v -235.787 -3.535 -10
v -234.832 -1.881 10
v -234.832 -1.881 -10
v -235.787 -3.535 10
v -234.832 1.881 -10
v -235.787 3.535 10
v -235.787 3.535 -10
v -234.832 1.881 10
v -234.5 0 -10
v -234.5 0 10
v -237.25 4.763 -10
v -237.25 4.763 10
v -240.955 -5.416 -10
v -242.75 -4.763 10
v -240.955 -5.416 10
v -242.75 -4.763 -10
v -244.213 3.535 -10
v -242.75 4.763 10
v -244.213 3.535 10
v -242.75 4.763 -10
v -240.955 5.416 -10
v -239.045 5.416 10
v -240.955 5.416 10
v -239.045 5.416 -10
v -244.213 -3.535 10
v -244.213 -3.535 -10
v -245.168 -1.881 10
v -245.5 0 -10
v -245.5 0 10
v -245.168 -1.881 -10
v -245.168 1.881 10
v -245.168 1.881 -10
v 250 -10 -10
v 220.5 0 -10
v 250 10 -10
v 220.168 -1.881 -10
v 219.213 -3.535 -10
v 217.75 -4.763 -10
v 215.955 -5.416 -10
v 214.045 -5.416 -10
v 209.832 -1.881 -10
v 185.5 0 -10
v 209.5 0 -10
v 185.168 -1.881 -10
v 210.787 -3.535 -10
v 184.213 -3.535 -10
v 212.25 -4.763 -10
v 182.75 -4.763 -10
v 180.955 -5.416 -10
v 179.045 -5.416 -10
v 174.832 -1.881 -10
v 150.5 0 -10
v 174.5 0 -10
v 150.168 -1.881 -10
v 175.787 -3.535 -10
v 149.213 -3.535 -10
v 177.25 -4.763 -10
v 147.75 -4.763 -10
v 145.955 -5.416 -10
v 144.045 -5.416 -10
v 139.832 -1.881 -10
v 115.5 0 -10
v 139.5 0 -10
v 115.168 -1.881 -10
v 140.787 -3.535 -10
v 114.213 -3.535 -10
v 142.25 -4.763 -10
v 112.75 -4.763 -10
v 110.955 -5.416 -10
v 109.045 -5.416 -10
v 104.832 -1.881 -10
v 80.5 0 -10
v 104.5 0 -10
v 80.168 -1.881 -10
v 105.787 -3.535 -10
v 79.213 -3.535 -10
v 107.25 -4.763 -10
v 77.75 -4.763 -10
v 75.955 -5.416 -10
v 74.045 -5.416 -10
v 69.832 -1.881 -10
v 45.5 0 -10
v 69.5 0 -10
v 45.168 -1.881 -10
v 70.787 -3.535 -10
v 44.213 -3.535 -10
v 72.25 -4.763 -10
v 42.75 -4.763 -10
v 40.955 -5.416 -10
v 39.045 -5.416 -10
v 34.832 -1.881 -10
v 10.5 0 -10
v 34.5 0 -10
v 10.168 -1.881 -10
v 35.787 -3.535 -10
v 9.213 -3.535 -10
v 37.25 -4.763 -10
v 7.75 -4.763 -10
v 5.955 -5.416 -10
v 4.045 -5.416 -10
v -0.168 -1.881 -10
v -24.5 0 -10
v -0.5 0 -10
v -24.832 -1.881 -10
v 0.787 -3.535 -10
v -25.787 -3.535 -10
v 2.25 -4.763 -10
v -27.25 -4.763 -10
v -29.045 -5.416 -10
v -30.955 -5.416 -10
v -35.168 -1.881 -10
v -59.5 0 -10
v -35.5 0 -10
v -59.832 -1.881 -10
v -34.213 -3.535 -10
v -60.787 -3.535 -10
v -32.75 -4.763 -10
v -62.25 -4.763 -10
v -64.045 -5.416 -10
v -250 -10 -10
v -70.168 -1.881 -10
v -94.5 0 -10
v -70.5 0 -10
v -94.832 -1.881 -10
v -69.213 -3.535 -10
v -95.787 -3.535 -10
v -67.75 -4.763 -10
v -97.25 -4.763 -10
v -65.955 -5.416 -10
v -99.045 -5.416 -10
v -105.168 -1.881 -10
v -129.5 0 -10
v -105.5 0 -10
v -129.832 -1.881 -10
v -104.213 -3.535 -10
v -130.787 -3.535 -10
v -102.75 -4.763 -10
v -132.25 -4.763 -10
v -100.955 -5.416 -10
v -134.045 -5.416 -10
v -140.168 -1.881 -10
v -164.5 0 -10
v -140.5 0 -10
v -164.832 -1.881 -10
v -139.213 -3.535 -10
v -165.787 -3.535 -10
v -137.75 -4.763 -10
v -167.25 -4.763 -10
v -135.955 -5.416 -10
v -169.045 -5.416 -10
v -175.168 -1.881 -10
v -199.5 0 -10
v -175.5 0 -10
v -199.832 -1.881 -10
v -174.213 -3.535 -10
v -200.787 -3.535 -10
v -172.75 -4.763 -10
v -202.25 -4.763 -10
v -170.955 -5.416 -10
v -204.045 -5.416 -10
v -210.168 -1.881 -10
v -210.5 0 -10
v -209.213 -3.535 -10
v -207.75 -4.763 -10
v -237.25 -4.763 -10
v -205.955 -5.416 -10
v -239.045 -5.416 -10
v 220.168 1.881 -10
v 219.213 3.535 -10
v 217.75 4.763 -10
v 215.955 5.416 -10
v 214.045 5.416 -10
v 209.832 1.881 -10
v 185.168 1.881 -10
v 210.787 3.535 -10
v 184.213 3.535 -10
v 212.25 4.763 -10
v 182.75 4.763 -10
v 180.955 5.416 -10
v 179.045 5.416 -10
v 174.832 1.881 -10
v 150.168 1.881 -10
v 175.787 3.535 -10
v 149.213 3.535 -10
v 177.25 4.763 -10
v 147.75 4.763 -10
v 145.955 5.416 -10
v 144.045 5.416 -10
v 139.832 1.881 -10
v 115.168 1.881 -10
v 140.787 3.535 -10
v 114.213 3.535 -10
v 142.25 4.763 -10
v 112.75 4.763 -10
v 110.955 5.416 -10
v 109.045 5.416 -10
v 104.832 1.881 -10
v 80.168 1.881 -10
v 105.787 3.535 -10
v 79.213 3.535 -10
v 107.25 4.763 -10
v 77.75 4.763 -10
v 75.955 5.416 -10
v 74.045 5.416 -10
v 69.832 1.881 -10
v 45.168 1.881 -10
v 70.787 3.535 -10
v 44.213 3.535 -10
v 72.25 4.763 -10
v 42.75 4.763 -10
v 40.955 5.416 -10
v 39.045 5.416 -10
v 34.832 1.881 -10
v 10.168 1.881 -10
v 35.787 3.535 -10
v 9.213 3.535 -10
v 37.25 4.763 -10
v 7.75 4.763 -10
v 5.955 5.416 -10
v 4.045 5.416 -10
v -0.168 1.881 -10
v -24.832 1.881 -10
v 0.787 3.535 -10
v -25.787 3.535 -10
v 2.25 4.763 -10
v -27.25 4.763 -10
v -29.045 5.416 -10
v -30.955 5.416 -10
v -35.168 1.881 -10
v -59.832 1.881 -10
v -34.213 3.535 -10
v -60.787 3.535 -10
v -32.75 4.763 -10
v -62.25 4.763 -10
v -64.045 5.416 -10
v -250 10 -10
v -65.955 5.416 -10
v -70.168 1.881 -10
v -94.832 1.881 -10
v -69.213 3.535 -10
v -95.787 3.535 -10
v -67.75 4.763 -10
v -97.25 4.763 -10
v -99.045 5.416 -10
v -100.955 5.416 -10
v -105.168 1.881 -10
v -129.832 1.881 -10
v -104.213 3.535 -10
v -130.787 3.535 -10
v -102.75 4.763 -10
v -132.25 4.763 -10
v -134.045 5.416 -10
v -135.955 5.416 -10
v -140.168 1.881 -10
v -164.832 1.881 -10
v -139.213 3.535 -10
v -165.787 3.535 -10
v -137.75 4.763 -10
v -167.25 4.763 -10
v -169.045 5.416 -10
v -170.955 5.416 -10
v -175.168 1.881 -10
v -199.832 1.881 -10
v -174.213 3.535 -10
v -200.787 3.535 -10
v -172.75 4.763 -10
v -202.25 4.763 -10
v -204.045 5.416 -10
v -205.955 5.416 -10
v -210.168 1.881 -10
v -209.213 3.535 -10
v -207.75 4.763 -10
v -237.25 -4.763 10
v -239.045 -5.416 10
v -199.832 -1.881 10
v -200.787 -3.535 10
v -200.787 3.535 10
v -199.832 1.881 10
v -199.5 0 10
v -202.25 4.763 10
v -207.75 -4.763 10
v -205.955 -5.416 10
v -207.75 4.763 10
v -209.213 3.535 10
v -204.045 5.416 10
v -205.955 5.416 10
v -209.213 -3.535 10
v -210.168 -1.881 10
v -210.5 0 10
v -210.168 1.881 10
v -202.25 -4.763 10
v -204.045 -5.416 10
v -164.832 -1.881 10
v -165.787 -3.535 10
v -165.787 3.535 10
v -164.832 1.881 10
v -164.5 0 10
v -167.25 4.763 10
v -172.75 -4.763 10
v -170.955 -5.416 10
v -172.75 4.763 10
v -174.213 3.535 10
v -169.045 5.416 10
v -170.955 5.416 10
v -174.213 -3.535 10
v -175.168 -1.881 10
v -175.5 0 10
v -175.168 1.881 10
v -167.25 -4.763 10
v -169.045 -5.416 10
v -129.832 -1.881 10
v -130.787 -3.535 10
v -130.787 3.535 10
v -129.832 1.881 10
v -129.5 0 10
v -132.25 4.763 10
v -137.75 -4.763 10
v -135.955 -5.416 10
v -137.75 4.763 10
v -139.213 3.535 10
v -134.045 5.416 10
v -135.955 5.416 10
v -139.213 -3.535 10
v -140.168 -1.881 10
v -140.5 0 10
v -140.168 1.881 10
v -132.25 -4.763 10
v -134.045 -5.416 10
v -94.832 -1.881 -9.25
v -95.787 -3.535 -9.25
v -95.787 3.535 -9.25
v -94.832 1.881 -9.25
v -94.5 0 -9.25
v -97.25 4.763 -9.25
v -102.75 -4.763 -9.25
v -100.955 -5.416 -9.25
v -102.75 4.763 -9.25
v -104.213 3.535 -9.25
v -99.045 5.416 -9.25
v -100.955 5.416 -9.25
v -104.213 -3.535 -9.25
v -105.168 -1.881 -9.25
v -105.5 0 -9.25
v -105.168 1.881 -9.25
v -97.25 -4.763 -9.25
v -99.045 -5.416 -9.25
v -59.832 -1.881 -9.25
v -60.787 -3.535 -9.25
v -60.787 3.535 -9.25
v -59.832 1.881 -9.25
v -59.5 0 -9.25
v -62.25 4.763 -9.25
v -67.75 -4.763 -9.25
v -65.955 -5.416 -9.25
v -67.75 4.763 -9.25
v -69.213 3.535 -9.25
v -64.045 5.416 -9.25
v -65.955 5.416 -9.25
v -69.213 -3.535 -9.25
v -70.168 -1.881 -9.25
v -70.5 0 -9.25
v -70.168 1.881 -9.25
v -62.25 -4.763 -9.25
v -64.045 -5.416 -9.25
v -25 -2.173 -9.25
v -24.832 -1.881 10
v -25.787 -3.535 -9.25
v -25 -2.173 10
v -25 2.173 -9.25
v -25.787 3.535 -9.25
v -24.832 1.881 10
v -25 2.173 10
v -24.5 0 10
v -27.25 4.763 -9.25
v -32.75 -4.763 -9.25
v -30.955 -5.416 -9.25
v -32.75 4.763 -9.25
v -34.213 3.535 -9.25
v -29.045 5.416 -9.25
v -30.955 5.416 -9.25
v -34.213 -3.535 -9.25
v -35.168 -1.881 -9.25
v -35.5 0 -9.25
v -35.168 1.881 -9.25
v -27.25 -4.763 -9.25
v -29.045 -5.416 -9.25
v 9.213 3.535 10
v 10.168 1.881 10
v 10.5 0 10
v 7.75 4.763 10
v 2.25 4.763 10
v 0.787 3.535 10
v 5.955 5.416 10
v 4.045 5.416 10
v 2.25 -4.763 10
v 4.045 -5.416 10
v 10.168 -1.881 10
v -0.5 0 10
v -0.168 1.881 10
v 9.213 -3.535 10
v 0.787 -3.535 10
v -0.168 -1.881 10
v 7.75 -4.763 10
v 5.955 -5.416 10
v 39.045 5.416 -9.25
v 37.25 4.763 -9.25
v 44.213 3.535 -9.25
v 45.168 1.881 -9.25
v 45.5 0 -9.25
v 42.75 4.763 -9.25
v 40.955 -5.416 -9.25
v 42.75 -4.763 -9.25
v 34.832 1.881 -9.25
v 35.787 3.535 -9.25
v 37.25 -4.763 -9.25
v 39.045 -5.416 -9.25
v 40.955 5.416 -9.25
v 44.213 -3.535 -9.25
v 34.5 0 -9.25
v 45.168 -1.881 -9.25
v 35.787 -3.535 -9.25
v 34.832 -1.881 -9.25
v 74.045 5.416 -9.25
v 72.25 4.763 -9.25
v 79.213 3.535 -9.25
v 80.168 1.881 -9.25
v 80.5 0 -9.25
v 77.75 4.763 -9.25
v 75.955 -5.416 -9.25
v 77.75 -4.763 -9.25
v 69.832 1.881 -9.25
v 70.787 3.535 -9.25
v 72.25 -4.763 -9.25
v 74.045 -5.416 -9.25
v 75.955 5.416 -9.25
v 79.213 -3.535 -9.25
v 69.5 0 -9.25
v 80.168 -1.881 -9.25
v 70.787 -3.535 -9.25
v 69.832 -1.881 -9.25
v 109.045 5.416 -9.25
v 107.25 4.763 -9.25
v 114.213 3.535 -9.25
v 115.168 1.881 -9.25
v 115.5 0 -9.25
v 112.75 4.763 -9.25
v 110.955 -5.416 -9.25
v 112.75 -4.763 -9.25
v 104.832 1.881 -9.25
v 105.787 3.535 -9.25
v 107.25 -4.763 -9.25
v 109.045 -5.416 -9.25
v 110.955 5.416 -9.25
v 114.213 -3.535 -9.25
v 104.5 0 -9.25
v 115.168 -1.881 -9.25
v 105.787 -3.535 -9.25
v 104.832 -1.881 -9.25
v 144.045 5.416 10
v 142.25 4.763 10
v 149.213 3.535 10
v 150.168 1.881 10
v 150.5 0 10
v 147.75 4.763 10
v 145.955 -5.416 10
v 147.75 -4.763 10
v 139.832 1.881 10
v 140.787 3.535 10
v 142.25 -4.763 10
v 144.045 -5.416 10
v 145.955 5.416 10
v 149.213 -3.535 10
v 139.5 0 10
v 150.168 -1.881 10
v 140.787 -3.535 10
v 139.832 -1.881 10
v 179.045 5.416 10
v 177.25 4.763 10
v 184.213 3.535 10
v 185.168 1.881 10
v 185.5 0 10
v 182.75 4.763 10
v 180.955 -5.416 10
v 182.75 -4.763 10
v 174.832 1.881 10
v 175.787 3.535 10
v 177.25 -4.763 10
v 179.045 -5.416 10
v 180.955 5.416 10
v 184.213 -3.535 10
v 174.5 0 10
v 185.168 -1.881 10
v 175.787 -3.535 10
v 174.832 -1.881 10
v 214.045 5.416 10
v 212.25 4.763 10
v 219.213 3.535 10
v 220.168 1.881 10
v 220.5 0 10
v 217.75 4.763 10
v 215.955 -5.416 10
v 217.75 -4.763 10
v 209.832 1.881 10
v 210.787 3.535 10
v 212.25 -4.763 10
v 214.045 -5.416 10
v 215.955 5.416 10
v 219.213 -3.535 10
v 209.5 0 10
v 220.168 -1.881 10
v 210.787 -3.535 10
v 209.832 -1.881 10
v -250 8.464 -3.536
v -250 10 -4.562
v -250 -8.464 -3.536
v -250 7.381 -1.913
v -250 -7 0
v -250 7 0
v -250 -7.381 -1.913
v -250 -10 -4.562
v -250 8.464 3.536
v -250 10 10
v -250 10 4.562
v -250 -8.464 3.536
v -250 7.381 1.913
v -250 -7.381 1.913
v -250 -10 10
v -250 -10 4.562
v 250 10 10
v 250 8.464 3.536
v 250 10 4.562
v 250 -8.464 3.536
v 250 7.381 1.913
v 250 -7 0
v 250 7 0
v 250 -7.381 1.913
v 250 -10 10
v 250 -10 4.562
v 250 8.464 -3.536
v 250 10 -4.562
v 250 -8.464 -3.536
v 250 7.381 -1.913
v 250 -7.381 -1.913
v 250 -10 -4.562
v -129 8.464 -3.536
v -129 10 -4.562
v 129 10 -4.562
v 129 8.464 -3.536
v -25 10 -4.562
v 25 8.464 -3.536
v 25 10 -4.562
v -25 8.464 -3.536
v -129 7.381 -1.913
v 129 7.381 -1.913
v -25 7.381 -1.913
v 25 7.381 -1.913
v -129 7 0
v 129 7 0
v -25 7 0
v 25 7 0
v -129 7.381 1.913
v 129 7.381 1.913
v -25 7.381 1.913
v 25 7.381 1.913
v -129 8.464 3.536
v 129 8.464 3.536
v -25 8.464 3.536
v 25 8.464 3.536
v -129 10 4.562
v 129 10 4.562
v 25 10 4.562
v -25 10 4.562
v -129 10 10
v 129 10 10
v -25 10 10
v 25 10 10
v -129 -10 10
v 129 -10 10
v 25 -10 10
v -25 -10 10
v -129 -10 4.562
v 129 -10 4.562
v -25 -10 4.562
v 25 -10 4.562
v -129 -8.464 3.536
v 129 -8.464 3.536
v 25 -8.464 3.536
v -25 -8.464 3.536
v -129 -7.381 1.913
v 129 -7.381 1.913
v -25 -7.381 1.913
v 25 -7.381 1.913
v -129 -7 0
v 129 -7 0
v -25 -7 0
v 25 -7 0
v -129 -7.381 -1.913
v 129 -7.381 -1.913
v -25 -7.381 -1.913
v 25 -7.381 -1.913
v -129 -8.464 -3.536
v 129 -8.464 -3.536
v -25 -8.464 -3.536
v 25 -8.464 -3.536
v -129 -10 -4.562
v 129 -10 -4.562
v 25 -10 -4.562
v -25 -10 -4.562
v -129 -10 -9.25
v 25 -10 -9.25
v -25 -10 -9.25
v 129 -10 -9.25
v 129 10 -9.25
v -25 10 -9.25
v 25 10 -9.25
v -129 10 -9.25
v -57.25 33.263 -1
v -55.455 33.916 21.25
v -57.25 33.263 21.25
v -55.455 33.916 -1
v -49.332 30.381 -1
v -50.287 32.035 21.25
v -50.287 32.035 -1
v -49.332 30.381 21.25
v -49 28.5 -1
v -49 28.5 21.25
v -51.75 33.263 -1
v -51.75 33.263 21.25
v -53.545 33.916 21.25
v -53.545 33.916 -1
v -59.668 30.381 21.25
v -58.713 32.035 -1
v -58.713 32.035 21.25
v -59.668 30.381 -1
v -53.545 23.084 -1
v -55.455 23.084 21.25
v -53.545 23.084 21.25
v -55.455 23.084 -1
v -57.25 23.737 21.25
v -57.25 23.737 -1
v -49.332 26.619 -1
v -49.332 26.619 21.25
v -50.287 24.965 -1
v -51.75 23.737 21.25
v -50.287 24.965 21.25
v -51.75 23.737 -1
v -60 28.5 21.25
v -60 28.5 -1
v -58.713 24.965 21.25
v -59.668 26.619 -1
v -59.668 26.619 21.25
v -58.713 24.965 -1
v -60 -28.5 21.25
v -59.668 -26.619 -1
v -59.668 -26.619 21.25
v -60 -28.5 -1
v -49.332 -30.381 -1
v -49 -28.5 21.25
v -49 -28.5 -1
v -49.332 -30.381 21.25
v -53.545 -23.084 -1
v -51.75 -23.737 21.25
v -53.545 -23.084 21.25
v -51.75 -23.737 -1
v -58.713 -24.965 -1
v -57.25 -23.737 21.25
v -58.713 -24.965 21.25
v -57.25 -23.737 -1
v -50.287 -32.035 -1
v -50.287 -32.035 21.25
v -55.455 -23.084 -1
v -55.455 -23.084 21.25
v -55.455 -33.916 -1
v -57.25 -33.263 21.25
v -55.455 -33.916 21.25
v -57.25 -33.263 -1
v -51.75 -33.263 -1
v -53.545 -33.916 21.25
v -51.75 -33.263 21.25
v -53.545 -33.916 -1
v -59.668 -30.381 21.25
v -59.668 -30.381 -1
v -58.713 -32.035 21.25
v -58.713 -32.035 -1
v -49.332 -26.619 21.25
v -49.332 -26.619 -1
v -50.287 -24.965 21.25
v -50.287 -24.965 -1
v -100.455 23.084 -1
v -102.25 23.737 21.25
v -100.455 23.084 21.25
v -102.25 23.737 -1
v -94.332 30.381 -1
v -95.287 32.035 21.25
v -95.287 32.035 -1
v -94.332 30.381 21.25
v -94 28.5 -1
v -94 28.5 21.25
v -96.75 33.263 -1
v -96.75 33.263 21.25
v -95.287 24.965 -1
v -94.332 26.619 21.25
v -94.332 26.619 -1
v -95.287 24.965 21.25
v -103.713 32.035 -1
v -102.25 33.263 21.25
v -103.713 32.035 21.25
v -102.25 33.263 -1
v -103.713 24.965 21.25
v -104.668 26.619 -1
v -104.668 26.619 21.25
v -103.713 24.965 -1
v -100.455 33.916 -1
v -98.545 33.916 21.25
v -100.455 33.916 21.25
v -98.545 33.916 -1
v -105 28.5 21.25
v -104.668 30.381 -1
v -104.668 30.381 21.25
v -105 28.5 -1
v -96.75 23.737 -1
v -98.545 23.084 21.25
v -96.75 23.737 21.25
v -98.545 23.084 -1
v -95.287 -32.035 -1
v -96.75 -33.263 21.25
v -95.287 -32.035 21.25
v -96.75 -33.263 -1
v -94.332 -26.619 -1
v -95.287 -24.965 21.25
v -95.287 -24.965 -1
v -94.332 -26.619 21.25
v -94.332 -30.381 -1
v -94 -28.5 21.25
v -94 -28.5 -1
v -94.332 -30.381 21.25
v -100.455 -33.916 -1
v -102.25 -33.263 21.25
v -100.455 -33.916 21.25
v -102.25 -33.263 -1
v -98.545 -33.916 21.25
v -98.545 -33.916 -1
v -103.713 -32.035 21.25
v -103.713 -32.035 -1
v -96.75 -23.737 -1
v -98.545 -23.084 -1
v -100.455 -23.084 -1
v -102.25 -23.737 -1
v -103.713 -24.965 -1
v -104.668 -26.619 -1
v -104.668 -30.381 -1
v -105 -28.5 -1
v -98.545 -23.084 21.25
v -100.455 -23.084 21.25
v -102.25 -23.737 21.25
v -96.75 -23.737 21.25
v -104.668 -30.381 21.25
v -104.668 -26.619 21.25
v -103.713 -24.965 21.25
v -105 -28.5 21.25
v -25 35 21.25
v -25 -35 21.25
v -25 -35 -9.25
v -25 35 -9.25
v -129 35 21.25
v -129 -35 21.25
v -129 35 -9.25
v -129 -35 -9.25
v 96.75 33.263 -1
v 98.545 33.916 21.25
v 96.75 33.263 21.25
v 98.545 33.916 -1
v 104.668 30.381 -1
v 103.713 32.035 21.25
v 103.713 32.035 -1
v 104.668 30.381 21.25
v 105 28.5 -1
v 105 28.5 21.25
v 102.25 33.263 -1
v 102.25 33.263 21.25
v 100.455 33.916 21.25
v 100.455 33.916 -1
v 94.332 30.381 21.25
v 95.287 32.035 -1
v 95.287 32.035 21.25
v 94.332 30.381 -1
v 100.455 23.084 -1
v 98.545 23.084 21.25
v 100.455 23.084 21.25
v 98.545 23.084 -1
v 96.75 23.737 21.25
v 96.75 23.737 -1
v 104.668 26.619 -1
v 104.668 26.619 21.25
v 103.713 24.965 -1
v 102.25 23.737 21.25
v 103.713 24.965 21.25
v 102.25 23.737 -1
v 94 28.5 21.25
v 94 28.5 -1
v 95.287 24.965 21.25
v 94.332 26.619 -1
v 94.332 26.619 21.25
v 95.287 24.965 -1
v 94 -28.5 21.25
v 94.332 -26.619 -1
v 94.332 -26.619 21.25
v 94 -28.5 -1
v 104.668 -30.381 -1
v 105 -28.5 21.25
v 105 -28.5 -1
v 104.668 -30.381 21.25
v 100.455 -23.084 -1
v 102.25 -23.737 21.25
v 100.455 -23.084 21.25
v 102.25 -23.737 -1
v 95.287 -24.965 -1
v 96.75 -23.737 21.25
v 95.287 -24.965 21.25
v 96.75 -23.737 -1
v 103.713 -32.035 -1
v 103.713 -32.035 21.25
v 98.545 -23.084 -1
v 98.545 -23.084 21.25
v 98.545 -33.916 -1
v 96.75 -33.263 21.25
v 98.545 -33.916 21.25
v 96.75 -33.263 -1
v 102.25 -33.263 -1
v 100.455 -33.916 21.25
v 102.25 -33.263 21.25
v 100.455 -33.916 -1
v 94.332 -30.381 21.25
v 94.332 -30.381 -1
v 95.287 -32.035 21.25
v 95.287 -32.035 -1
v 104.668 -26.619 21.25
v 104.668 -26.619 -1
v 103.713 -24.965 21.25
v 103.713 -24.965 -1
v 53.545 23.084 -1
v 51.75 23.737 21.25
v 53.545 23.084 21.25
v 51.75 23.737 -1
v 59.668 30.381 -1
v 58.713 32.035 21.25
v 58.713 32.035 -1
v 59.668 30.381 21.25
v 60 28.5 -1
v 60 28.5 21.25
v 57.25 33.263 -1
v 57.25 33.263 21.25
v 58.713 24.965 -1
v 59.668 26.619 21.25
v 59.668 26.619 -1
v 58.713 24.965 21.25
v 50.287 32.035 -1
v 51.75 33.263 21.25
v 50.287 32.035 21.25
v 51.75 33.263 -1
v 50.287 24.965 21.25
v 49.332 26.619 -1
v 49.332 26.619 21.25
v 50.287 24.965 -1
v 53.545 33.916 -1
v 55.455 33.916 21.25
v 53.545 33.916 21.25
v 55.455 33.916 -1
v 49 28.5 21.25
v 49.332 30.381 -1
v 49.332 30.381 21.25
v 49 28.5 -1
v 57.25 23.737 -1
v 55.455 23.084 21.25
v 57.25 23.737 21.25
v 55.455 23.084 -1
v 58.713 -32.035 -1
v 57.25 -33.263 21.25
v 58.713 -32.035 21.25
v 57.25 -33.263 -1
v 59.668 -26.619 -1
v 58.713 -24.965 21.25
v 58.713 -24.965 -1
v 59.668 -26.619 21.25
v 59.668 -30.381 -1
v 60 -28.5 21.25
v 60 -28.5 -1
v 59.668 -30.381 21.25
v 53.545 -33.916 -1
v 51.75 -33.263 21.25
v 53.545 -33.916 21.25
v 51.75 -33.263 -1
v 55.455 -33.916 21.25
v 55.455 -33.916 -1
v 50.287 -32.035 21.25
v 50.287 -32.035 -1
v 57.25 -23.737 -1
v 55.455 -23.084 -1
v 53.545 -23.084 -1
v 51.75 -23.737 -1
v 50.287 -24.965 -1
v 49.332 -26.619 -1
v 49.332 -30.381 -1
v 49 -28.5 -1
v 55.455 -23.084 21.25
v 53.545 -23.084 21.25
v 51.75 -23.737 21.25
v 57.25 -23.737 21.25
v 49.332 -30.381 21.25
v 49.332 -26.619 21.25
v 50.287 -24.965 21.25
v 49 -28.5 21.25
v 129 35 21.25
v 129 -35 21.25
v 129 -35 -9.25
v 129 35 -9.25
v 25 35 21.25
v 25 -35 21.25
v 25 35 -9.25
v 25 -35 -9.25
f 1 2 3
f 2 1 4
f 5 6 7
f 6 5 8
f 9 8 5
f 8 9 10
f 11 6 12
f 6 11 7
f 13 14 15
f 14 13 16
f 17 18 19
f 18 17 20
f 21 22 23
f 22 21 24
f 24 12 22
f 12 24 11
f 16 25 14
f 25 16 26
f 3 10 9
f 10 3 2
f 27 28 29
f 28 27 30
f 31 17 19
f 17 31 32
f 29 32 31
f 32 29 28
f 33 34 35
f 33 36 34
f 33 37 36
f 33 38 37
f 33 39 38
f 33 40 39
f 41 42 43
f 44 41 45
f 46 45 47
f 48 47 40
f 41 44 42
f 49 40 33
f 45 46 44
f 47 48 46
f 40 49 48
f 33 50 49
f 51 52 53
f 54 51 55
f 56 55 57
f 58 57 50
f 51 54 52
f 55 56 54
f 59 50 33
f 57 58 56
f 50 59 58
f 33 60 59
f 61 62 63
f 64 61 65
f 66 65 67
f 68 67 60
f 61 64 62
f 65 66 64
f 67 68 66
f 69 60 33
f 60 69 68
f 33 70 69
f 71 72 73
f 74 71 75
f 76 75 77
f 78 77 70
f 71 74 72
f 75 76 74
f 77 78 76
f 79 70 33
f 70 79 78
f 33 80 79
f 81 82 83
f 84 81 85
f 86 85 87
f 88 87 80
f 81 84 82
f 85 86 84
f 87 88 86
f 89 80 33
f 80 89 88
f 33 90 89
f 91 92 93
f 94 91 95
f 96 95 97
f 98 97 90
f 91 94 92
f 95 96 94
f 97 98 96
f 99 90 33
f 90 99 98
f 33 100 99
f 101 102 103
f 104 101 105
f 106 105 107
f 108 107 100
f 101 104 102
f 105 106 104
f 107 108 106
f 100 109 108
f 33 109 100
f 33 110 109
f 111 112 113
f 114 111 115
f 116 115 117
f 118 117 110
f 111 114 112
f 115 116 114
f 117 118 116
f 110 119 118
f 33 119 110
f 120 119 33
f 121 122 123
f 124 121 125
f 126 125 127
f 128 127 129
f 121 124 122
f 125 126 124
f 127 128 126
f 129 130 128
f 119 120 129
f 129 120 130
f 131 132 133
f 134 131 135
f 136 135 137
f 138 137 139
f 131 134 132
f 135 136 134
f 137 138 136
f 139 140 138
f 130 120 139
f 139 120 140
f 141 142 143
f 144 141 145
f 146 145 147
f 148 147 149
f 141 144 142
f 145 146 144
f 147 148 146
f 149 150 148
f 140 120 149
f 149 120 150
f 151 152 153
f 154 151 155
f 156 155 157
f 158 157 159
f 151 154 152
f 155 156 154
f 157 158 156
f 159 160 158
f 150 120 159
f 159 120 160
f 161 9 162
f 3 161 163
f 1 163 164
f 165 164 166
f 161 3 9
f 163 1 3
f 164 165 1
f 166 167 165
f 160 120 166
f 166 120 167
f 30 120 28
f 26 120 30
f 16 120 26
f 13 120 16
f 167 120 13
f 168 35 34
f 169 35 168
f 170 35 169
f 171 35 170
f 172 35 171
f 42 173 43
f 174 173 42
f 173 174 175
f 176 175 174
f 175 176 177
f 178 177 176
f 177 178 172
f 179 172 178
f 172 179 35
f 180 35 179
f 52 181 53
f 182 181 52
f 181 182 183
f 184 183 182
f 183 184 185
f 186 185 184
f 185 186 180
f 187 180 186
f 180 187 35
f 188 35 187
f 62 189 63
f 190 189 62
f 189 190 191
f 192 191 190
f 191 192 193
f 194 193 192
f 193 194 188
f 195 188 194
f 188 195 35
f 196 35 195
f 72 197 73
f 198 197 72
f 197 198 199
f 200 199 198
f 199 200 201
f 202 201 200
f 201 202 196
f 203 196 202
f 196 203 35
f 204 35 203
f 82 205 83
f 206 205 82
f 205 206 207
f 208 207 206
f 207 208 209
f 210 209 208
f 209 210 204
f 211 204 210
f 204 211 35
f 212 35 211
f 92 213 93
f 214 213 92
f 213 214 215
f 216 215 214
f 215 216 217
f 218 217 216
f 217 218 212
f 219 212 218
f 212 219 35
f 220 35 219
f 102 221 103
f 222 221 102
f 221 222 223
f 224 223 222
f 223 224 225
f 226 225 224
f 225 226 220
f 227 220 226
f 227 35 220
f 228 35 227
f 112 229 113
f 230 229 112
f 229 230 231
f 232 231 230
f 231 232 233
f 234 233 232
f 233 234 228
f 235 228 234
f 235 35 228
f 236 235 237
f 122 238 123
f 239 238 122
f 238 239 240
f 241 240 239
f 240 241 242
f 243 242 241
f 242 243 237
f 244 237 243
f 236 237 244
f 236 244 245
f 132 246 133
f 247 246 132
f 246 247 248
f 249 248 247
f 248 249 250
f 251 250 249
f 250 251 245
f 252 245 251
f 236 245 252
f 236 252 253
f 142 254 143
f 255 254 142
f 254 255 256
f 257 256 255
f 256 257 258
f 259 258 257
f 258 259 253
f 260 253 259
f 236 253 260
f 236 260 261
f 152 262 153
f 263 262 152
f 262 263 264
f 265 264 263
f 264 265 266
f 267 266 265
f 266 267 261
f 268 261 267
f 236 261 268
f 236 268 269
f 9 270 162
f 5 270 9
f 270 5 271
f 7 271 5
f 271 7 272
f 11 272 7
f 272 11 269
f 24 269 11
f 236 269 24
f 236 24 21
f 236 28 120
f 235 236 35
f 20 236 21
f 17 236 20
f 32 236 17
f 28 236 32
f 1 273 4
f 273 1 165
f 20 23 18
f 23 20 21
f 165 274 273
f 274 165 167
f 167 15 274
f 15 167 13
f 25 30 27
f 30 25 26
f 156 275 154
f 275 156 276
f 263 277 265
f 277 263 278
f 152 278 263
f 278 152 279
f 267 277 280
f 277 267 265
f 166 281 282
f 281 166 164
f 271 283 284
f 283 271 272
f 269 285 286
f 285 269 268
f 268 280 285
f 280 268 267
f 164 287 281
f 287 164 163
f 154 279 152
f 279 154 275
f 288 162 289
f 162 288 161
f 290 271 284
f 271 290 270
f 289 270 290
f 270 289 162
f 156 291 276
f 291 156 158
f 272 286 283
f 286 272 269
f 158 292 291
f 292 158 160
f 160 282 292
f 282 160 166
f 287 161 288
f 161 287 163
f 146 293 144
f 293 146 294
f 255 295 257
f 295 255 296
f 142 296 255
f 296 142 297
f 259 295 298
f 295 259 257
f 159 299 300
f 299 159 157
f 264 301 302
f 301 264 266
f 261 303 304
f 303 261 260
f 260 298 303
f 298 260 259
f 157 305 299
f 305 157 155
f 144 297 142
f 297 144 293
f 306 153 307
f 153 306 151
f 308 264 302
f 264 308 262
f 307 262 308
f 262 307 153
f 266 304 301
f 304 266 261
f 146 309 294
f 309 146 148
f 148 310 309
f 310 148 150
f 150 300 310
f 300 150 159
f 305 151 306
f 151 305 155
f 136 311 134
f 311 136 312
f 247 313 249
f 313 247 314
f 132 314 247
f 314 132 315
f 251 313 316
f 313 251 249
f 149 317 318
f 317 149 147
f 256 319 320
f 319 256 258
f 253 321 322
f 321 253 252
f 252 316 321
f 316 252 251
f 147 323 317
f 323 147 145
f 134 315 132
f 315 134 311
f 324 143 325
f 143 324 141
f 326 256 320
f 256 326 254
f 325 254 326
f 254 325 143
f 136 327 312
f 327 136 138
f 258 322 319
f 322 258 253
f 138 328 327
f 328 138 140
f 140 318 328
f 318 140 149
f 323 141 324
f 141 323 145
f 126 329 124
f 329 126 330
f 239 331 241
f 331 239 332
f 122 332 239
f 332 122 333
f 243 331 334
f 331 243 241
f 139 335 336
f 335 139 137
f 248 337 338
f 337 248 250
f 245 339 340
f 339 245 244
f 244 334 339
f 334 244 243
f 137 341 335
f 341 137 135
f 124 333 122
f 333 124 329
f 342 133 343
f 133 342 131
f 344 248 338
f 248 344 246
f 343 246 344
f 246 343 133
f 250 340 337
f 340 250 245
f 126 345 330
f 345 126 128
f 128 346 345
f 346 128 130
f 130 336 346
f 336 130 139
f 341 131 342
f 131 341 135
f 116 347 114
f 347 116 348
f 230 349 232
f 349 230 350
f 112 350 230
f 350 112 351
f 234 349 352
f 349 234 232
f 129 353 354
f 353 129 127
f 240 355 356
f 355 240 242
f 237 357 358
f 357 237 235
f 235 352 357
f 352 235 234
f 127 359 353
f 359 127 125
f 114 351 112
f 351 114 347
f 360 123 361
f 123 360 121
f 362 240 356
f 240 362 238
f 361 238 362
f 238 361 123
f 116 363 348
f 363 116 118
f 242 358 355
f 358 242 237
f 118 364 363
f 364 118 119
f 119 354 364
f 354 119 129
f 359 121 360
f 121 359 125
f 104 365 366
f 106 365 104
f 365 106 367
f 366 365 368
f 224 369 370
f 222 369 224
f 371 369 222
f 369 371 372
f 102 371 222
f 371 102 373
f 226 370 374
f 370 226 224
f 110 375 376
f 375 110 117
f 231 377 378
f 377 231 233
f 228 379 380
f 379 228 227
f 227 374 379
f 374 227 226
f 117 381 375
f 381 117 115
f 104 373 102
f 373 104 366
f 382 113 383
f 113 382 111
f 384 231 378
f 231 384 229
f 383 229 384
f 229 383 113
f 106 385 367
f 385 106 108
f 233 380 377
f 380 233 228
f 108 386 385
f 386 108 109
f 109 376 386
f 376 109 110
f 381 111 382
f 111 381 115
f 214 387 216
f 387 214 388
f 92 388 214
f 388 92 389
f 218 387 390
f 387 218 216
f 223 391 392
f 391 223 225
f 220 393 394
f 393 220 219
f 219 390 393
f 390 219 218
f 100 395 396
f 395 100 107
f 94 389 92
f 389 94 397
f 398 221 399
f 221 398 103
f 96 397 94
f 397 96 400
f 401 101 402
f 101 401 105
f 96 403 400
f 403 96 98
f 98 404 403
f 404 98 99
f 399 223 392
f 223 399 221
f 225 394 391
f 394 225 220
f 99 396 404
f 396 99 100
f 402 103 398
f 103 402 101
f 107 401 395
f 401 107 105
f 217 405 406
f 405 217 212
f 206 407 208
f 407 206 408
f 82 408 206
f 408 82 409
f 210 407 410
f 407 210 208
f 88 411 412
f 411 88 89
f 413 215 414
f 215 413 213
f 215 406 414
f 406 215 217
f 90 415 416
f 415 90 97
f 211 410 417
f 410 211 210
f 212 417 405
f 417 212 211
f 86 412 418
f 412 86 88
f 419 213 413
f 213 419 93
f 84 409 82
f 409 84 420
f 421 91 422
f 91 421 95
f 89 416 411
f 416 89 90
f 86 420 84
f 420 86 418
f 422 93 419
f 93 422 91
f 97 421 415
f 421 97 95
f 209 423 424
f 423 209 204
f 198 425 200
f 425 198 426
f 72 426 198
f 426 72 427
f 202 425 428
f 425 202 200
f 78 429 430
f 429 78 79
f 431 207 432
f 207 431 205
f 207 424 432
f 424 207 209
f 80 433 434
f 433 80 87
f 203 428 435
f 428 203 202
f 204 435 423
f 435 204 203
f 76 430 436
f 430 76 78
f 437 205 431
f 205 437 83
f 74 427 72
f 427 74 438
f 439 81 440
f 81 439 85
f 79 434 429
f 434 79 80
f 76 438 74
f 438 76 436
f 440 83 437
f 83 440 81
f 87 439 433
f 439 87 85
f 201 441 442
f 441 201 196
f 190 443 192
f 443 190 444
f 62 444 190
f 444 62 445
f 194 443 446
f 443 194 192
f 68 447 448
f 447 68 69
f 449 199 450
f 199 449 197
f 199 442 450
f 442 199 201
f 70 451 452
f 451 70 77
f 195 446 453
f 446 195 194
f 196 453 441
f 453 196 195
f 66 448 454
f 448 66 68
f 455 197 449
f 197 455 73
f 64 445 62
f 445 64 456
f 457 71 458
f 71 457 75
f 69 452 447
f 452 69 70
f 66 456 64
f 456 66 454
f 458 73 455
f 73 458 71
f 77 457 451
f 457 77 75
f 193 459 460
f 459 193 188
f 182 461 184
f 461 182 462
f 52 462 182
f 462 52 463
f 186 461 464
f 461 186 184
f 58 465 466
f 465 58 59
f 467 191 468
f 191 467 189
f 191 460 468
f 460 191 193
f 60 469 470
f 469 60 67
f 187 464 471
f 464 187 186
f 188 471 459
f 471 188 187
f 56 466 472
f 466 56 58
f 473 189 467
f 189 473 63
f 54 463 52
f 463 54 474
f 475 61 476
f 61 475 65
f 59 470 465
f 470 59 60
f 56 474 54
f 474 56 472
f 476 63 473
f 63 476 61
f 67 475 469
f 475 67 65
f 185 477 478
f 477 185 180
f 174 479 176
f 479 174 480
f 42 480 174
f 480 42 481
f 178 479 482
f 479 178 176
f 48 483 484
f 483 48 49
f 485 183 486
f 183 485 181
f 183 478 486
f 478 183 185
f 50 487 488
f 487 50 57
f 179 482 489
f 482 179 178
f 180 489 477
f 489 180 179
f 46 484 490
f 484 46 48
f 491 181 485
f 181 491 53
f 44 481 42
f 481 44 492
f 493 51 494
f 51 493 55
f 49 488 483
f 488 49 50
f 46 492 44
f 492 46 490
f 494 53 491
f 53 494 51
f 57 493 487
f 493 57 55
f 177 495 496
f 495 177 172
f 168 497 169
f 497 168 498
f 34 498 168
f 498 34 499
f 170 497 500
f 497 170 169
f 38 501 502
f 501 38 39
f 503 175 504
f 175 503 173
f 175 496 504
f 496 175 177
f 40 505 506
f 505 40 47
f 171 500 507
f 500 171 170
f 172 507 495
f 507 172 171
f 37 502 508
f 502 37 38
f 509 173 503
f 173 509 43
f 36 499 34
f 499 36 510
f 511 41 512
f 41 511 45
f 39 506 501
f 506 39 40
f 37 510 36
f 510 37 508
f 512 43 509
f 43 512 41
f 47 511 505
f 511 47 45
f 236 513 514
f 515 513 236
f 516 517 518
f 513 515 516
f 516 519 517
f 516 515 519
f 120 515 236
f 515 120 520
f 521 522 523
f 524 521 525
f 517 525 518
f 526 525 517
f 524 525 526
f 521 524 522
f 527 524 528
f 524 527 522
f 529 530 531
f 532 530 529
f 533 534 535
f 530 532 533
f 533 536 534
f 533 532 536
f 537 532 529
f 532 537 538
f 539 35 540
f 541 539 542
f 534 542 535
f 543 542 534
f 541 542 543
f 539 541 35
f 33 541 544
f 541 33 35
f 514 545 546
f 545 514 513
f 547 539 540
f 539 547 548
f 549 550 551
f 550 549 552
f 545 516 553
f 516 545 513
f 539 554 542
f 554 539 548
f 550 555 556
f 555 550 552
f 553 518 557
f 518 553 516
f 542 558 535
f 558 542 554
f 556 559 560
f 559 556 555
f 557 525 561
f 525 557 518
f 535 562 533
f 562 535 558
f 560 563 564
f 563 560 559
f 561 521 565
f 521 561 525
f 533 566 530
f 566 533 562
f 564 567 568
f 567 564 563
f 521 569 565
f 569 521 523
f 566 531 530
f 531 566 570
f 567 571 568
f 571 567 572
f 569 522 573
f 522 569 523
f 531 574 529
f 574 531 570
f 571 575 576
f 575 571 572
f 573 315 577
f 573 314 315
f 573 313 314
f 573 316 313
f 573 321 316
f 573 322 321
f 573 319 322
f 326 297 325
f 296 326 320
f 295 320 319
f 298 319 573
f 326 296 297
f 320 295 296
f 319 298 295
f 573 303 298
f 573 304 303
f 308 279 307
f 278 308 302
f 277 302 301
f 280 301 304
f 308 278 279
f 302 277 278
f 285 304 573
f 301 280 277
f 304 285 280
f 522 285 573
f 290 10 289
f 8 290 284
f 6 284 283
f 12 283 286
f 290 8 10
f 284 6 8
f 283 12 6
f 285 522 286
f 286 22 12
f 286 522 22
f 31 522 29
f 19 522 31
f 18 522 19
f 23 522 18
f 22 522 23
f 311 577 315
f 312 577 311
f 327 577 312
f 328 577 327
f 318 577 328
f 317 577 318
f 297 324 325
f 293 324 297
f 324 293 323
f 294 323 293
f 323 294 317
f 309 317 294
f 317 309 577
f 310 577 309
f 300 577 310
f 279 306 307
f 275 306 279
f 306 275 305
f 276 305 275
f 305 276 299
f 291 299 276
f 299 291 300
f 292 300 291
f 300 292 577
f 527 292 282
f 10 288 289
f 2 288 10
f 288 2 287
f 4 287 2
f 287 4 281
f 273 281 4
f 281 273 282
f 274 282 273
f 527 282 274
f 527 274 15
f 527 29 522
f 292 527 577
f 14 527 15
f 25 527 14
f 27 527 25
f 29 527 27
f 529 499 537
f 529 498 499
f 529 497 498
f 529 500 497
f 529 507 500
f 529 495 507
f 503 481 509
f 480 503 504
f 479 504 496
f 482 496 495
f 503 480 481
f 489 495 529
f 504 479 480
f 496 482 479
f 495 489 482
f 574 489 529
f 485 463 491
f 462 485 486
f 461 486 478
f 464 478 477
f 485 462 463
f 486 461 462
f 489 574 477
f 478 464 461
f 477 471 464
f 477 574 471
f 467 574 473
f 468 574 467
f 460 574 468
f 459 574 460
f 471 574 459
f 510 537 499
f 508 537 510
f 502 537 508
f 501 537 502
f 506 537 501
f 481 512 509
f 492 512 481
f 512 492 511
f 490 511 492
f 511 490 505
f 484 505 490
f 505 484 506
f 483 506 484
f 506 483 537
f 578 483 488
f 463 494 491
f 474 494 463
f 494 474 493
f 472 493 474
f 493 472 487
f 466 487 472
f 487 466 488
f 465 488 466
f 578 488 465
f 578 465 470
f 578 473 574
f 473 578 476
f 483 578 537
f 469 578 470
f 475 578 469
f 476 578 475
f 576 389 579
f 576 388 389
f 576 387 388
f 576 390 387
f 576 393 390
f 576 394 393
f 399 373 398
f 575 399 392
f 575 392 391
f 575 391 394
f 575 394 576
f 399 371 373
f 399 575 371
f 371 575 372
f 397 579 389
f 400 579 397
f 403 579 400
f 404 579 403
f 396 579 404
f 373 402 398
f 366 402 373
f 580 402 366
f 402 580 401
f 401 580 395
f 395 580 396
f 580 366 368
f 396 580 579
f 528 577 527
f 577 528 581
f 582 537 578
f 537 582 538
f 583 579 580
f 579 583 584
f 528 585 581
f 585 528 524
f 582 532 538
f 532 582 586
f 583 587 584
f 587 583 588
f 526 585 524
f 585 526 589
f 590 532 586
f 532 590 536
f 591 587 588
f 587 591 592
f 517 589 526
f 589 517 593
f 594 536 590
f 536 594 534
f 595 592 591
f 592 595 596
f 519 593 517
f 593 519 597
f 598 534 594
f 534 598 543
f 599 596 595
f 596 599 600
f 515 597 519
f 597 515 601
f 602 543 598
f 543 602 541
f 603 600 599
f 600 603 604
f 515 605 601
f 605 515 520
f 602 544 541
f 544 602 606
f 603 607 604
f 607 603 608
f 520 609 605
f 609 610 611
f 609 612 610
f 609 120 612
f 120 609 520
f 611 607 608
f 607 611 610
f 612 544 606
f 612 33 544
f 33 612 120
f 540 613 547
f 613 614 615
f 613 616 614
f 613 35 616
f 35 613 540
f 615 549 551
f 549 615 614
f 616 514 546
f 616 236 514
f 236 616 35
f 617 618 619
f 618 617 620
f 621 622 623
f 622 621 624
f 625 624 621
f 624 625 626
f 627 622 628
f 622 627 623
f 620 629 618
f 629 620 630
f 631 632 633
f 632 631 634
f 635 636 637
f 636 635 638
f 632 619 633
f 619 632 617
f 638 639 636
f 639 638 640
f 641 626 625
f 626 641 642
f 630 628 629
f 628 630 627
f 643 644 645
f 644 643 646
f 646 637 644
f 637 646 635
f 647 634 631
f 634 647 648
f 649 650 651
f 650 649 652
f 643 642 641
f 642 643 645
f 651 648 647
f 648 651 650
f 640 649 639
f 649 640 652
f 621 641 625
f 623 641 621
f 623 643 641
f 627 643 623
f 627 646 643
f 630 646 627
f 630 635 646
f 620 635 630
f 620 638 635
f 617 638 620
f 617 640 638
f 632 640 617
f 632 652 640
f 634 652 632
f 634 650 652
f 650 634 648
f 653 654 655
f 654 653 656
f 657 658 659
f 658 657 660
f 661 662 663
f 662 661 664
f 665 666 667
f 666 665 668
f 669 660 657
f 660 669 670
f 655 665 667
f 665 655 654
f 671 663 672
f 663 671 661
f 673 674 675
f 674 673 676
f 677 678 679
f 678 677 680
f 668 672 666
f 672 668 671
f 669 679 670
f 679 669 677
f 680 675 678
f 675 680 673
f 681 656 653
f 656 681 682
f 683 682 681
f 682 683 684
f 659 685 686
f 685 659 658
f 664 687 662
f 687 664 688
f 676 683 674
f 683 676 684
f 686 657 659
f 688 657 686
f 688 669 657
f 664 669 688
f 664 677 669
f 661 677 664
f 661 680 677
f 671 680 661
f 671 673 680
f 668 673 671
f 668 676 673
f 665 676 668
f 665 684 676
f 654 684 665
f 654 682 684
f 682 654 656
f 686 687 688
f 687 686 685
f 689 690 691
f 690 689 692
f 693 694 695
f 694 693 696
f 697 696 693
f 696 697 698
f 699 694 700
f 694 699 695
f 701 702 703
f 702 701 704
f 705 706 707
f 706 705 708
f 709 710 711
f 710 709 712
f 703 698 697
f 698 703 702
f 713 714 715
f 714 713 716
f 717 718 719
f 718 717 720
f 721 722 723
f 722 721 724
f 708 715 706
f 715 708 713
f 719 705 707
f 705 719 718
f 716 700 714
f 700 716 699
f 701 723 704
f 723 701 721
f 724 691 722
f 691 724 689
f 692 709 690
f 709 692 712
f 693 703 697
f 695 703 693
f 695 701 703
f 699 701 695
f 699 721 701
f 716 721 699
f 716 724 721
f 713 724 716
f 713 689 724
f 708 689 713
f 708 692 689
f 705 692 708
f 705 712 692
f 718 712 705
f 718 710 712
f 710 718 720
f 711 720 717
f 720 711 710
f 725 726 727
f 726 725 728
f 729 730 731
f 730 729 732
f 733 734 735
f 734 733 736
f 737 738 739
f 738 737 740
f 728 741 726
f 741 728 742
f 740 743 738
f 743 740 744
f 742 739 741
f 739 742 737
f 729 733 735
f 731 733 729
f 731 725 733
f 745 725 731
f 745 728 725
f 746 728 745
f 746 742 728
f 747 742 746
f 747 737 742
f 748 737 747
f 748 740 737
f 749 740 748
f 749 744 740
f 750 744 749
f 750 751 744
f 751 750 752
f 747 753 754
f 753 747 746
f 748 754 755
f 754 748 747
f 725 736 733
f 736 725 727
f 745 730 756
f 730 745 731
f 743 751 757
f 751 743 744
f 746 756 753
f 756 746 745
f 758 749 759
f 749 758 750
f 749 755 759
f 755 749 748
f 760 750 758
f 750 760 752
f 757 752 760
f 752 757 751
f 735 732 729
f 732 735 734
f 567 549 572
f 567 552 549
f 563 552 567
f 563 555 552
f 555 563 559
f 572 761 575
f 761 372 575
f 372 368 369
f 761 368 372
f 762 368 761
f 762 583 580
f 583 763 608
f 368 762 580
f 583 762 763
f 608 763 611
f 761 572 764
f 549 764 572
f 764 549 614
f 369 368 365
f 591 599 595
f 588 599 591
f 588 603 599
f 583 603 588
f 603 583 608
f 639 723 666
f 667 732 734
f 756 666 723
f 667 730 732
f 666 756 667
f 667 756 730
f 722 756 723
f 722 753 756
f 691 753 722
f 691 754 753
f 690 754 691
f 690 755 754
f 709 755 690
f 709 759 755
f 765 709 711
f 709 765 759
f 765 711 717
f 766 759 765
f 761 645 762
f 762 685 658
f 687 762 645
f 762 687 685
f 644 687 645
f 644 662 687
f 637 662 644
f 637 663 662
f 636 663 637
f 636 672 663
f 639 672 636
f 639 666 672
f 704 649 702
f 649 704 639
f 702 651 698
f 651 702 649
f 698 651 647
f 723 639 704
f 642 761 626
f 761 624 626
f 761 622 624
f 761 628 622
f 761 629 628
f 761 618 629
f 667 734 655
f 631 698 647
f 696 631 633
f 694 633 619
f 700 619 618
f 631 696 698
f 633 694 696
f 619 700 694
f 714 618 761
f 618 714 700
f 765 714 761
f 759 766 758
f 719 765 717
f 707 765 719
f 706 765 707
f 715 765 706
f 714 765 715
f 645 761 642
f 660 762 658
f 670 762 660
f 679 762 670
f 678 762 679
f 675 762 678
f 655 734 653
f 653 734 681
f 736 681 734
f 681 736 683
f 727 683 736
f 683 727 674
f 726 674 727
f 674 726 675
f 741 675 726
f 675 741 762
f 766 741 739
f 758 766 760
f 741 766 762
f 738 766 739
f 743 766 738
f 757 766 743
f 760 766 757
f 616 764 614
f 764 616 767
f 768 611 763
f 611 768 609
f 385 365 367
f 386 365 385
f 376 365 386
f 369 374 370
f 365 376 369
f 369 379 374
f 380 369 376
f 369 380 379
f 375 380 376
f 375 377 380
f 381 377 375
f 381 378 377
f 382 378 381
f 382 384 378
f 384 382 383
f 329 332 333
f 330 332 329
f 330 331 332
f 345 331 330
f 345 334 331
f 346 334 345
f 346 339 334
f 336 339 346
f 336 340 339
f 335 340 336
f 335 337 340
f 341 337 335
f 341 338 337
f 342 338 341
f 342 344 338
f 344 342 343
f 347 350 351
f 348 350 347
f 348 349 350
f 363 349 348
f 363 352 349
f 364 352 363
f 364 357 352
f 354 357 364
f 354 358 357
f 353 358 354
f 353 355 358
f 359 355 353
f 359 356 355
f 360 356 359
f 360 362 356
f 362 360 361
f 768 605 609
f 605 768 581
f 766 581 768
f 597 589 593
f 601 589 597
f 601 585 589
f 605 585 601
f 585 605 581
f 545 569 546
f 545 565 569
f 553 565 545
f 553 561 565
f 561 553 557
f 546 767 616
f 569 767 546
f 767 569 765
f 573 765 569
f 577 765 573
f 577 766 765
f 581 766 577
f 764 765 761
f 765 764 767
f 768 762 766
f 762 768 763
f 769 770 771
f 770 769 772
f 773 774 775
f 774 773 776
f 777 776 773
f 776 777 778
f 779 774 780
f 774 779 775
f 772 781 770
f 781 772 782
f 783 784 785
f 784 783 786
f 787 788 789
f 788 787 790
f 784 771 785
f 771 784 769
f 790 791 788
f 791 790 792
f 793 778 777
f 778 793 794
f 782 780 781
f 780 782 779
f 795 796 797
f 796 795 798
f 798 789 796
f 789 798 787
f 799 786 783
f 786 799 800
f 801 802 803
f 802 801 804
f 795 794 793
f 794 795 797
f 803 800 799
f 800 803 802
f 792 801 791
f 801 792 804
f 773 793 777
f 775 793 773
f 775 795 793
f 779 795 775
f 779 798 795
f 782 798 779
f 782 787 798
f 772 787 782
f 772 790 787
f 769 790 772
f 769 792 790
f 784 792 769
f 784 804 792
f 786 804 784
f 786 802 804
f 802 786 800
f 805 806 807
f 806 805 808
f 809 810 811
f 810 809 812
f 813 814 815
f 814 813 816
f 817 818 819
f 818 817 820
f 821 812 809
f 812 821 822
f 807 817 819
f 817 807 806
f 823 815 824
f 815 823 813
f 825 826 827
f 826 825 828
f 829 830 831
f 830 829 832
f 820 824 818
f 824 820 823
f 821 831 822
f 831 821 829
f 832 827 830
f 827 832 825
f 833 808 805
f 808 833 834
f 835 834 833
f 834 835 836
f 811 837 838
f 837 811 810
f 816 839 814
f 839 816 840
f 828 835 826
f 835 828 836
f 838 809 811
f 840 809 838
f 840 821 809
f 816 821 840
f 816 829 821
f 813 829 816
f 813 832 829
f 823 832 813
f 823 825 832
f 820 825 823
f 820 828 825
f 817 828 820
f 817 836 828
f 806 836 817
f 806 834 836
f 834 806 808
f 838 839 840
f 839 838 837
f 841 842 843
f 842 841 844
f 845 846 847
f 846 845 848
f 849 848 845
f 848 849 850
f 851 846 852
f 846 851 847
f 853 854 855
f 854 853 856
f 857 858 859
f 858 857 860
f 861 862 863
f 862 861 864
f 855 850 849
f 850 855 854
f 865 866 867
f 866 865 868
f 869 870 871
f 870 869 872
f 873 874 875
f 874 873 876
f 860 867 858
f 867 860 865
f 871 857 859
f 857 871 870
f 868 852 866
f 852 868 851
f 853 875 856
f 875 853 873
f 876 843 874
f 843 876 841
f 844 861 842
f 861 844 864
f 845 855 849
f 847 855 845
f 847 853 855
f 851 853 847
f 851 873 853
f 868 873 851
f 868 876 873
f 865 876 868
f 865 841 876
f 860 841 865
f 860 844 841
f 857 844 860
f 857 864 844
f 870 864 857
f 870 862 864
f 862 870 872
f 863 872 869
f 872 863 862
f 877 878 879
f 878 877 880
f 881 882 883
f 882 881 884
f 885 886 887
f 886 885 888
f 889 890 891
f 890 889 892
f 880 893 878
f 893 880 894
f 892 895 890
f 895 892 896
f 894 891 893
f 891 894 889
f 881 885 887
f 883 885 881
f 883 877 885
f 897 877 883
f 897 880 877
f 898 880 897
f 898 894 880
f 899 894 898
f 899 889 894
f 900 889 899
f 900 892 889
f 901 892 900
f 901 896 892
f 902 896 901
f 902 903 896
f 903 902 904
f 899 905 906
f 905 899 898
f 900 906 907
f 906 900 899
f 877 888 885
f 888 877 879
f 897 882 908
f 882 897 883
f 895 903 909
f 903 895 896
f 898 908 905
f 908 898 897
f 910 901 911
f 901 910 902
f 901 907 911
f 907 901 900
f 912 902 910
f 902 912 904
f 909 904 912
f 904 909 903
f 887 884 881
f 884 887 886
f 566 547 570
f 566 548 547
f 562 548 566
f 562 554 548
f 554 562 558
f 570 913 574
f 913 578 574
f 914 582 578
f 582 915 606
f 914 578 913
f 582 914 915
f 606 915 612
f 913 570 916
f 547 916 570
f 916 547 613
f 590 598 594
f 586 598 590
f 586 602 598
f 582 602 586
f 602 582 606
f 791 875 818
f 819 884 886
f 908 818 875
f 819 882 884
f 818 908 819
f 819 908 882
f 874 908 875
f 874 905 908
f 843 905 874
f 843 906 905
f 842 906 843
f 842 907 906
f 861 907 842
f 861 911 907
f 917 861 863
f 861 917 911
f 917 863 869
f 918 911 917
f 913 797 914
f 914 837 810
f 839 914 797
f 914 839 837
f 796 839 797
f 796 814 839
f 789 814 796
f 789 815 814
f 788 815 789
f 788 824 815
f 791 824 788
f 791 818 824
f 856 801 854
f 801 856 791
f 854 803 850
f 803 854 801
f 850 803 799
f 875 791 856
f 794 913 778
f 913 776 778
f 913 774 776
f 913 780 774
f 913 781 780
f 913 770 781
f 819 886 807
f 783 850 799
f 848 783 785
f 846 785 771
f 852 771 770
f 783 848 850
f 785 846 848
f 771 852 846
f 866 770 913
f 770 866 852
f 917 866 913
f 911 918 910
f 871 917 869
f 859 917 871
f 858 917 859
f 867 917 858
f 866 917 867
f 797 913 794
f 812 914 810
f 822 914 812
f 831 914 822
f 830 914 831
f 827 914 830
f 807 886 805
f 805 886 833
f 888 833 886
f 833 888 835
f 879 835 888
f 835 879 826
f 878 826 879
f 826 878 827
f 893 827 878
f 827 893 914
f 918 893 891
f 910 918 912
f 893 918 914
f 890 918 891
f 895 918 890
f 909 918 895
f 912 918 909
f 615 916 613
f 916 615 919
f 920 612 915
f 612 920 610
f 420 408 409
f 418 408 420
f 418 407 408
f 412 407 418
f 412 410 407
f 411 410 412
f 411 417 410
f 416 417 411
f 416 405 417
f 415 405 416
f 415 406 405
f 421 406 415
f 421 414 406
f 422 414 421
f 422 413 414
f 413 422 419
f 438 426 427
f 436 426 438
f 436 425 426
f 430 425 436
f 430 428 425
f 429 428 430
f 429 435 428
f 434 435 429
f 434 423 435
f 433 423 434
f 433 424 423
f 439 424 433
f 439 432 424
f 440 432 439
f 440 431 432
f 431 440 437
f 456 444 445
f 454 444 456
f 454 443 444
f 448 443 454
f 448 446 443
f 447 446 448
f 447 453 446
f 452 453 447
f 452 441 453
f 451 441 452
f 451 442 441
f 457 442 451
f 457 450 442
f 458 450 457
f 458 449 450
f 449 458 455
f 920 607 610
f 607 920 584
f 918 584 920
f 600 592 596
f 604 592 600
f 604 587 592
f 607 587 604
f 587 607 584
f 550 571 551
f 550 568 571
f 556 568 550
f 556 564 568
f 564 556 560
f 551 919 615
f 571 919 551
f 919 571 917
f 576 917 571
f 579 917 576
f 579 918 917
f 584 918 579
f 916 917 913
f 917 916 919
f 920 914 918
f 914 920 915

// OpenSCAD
// file: Library.scad
/*
 * Generic modules for manipulating objects
 */

module mirror_copy(vec=[0,1,0]) { 
    children(); 
    mirror(vec) children(); 
}

module move(x=0, y=0, z=0) {
    translate([x, y, z]) children();
}
// main file
use <Library.scad>;

module squareLinearRail(length=100, size=25, blockspacing = 10) {
	difference() {
		rotate([90,0,90]) translate([-10,-10,-length/2]) linear_extrude(height=length) difference() {
			square(20);
			translate([-2,10,0]) circle(5);
			translate([22,10,0]) circle(5);
		}
		for (x = [-length/2+10: 35 : length/2 - 10])
			translate([x, 0, -10]) cylinder(d=11, h=length);
	}
	
	translate([-blockspacing/2-104/2,0,0]) squareRailBlock();
	translate([blockspacing/2+104/2,0,0]) squareRailBlock();
	
}

module squareRailBlock() {
	difference() {
		translate([0,0,6]) cube([104, 70, 36-5.5], center=true);
		mirror_copy() translate([45/2,57/2,-1]) cylinder(d=11, h=100);
		mirror_copy() translate([-45/2,57/2,-1]) cylinder(d=11, h=100);
	}
}



squareLinearRail(length=500, blockspacing = 50);
